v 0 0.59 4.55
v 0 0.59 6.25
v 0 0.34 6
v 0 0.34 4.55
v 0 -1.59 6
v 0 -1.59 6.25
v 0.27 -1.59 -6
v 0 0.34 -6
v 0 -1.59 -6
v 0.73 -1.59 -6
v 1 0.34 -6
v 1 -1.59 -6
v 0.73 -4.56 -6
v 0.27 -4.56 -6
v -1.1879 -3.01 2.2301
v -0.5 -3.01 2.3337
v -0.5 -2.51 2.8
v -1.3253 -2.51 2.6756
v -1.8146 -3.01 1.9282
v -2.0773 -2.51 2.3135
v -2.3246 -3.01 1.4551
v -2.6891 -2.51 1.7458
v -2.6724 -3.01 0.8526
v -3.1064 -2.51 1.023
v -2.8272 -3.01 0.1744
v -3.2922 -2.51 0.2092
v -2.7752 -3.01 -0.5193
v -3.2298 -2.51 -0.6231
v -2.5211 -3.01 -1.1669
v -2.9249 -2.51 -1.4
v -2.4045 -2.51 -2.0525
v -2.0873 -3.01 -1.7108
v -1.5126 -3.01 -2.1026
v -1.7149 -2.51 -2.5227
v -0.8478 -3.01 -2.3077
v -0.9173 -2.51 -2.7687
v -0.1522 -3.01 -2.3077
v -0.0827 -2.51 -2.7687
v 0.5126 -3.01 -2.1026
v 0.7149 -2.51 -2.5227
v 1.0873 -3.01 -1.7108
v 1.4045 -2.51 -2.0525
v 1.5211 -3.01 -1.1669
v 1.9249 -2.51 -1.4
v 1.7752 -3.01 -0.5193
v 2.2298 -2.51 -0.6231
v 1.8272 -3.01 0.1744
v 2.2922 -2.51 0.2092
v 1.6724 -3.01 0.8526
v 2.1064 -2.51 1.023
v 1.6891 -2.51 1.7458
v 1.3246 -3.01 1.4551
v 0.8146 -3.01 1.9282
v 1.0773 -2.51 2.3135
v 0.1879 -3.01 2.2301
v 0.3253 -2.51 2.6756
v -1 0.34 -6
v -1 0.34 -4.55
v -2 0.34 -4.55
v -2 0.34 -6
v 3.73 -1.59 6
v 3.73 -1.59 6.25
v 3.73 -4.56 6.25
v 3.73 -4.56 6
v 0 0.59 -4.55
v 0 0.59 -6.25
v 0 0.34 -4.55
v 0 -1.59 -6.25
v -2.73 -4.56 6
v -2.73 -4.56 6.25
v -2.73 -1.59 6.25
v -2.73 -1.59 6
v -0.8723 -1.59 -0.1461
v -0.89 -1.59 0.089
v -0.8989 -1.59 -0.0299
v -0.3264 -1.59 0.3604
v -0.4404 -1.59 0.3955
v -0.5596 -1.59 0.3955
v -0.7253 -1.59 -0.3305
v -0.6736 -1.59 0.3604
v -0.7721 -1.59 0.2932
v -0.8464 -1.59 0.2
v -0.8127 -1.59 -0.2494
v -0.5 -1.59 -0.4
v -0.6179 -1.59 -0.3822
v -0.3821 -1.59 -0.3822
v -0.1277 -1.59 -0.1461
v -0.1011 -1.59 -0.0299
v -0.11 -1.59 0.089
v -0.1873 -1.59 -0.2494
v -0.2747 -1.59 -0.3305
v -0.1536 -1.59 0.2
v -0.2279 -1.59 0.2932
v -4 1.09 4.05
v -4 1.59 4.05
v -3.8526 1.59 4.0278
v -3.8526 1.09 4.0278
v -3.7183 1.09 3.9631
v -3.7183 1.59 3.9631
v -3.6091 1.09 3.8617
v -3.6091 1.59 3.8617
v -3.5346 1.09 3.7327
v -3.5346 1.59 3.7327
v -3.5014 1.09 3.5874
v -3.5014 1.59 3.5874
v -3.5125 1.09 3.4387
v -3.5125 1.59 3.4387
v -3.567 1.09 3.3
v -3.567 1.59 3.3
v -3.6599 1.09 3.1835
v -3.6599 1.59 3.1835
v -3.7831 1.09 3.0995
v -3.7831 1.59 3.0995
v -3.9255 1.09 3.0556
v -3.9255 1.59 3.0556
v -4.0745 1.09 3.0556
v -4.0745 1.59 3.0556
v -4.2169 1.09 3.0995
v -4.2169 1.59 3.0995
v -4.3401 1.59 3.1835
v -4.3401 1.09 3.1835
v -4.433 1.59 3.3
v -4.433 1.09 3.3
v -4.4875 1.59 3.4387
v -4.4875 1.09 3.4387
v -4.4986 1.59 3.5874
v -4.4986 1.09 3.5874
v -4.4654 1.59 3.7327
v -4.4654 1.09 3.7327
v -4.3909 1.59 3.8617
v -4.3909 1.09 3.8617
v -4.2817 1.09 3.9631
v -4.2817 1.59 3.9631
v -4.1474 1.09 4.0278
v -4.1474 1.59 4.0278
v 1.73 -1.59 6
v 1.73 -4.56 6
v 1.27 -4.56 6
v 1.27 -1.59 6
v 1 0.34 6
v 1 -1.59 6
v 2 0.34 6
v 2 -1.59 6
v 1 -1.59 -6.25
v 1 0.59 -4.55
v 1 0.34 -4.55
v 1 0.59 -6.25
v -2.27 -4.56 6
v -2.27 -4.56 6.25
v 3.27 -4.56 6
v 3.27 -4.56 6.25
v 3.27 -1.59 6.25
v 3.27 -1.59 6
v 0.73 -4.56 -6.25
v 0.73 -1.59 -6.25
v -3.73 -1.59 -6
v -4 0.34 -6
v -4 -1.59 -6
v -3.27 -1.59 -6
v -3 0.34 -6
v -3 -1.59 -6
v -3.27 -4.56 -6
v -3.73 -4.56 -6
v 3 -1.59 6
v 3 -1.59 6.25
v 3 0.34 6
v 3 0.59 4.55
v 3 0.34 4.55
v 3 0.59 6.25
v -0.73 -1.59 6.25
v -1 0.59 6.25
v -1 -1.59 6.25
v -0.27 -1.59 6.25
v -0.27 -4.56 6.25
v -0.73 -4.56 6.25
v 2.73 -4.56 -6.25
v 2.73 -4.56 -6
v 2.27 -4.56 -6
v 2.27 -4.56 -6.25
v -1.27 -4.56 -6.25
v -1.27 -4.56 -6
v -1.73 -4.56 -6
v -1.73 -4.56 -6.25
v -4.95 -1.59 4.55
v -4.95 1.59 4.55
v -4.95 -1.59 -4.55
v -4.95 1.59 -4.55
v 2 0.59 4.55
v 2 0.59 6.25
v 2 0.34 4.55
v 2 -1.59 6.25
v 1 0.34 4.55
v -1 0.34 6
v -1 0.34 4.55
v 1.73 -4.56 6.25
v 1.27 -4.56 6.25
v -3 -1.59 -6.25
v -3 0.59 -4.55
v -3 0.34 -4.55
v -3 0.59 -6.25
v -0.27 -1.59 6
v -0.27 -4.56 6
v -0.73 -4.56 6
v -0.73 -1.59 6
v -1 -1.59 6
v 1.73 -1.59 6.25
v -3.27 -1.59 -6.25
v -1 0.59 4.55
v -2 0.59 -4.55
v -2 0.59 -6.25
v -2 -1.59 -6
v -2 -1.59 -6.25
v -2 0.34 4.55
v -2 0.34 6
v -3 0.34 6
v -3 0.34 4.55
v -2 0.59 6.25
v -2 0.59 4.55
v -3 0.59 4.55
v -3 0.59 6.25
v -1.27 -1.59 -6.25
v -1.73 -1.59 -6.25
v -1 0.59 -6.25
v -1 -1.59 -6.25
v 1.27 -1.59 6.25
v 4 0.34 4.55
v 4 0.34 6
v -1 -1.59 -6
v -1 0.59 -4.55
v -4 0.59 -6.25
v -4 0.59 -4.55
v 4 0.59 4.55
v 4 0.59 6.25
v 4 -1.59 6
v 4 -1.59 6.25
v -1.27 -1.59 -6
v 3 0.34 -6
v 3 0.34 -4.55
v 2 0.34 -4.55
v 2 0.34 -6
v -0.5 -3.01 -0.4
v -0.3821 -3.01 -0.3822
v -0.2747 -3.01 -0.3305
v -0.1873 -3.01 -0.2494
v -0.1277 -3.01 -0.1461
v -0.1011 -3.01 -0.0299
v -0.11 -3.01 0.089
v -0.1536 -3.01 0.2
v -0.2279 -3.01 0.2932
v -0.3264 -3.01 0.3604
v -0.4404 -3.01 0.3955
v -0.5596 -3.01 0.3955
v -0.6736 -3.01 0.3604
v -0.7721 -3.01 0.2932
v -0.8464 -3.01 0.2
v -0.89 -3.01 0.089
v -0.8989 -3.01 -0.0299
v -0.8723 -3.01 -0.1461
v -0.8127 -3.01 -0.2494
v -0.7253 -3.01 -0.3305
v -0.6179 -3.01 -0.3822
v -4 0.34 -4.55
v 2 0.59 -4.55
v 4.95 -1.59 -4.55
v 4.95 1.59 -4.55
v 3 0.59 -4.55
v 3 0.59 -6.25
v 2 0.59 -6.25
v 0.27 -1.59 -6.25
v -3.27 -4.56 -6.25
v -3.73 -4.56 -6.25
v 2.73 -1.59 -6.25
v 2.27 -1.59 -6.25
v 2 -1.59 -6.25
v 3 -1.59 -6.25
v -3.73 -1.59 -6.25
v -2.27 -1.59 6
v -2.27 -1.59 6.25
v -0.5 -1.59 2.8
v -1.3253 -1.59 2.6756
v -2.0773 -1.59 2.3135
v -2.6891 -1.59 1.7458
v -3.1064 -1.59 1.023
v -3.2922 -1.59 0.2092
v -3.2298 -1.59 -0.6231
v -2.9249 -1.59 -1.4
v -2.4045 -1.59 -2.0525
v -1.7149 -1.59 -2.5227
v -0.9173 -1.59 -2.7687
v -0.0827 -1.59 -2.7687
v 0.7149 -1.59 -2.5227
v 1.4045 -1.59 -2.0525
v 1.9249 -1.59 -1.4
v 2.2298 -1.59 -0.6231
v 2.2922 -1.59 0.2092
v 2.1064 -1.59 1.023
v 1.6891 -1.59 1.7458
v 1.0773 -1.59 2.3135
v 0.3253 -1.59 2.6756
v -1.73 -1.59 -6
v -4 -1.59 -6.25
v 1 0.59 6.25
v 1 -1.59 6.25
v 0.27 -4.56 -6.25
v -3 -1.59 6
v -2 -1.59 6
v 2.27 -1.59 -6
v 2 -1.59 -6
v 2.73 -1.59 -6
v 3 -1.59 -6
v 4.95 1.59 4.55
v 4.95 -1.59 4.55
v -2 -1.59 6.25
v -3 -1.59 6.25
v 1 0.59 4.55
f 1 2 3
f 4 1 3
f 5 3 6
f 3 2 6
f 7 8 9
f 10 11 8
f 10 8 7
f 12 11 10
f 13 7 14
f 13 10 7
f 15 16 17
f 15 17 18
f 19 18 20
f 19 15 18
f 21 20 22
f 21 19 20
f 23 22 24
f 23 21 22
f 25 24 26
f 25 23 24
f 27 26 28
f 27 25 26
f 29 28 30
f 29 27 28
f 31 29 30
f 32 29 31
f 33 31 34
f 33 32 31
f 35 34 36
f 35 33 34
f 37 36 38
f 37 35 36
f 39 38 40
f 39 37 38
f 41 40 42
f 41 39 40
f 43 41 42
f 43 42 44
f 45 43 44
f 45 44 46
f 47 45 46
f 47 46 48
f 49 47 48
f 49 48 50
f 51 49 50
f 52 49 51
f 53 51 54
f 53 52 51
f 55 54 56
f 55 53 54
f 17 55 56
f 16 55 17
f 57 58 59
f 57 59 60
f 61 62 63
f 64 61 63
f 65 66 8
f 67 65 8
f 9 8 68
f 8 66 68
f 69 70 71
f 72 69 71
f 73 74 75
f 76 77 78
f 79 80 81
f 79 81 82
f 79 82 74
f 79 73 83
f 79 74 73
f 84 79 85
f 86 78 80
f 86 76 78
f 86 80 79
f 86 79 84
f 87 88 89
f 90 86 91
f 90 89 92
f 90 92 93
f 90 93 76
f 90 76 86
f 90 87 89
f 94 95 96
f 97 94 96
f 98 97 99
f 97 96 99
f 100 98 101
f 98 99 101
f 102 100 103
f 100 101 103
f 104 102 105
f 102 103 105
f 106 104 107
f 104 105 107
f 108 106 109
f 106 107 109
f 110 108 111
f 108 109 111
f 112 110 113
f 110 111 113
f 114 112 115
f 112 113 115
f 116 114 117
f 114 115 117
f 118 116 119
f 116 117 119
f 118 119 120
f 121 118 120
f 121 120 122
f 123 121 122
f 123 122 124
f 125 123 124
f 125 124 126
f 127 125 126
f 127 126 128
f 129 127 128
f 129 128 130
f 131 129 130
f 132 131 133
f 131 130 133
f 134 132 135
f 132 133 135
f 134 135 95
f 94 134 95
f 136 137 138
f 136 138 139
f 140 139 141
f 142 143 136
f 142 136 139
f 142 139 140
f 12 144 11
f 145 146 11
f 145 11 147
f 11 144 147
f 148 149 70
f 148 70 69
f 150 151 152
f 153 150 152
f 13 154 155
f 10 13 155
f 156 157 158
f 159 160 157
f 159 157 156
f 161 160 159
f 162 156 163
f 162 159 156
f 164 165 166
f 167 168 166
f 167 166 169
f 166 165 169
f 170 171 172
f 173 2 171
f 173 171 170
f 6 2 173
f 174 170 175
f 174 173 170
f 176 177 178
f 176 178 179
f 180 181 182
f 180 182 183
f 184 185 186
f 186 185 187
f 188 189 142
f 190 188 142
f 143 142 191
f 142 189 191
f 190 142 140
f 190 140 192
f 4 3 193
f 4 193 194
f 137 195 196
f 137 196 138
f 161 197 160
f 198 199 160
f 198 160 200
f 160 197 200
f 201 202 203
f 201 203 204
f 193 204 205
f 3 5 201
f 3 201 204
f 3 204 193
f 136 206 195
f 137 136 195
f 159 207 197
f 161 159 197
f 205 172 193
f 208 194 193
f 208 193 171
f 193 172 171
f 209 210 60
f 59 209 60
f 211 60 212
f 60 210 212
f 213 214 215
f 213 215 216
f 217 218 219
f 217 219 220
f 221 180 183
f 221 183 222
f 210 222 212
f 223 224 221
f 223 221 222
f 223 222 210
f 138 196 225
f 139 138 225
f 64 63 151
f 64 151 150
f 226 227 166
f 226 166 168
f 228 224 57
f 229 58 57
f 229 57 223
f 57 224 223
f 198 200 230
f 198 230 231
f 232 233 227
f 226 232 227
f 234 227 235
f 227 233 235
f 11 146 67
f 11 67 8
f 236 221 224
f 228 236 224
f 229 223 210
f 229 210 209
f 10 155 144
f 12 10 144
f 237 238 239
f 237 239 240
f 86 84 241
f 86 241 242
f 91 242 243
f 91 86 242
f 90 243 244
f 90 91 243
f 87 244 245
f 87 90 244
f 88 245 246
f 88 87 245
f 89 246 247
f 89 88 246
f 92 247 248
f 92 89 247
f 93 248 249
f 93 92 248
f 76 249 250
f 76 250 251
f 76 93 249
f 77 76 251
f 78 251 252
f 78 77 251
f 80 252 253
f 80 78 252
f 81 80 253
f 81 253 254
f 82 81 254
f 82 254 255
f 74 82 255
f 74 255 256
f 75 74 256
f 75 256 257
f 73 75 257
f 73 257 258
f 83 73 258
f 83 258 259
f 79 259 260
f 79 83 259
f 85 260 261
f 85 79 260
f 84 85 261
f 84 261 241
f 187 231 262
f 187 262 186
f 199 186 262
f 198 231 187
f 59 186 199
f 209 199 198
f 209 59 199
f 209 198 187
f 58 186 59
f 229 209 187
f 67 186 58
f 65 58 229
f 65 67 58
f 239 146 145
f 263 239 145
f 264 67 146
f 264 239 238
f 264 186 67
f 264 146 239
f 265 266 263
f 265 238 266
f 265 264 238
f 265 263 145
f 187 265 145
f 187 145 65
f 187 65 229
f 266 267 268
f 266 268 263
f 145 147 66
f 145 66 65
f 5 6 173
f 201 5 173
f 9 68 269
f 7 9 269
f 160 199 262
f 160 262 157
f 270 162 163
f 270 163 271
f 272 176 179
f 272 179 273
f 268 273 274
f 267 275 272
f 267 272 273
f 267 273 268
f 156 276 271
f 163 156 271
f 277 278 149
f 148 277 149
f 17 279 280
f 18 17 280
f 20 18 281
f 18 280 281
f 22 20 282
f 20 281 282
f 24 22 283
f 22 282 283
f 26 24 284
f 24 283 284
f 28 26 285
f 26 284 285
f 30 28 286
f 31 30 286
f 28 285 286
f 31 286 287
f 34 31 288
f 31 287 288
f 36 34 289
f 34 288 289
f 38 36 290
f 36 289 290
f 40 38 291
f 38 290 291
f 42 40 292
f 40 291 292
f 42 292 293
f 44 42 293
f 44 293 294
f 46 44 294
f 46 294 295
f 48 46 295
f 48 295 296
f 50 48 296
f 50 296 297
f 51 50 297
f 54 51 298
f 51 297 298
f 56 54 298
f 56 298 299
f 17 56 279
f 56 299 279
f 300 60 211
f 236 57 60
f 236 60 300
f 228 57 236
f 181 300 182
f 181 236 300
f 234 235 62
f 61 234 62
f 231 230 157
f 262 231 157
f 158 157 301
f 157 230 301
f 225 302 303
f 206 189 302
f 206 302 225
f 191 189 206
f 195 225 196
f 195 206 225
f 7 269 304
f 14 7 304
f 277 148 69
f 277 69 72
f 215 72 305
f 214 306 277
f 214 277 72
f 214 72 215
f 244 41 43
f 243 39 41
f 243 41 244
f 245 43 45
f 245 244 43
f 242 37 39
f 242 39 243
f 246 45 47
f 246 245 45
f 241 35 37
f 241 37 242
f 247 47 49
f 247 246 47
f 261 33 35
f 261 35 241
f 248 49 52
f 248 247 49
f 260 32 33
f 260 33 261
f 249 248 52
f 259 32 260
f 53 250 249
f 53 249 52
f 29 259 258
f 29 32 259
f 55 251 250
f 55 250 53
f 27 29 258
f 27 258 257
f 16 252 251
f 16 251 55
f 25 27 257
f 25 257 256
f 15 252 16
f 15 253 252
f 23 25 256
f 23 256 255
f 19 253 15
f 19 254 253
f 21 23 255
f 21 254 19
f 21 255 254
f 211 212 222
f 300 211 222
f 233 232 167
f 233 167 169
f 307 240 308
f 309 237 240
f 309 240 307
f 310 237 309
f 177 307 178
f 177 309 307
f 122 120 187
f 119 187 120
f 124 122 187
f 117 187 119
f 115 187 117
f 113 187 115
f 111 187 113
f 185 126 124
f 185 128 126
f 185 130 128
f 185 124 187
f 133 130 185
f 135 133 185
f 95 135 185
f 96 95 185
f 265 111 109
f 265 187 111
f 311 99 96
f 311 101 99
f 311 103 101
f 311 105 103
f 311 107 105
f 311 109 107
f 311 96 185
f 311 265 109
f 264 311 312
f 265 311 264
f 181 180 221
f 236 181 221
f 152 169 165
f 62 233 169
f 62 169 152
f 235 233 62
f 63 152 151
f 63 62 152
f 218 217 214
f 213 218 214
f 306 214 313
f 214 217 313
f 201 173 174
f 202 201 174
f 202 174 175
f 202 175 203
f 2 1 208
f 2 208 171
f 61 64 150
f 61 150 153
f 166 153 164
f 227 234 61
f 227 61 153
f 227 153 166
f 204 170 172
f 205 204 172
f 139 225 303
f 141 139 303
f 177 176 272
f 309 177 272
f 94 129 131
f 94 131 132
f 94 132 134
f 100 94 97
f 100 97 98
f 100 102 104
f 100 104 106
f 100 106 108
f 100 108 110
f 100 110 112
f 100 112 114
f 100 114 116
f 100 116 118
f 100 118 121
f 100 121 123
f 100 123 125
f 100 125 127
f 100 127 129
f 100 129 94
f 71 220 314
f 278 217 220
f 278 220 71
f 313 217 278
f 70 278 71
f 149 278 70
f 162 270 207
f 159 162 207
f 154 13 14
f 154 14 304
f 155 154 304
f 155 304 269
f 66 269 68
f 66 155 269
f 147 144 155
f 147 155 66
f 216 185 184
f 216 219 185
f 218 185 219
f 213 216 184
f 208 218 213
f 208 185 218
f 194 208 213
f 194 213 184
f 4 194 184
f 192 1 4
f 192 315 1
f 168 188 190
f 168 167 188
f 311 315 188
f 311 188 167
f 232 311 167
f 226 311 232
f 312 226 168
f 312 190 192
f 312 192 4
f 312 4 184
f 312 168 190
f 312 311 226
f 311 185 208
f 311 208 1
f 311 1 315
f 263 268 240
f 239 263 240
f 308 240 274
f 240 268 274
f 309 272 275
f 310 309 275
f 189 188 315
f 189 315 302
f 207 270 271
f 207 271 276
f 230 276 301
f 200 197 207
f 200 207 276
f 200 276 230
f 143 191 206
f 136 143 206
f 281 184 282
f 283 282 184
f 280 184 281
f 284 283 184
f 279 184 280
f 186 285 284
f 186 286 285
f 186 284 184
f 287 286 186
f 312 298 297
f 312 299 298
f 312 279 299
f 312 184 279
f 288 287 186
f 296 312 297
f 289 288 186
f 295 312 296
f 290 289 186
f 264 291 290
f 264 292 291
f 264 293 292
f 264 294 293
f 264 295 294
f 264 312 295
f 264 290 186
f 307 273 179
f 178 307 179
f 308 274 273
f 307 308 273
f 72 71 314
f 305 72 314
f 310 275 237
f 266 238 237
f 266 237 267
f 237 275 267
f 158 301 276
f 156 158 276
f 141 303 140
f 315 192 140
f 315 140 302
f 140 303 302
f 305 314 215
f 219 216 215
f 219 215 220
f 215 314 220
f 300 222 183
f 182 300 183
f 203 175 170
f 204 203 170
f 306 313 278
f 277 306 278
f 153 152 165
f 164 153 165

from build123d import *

# Parameters (mm, degrees)
EXTRUDE_1_DEPTH     = 4.95
SKETCH_2_R          = 0.5
CUT_EXTRUDE_1_DEPTH = 0.5
CUT_EXTRUDE_2_REACH = 16.197
CUT_EXTRUDE_3_REACH = 16.197
SKETCH_5_R          = 2.8
SKETCH_5_R_2        = 0.4
EXTRUDE_2_DEPTH     = 1.42
CHAMFER_1_SIZE      = 0.5
CHAMFER_1_SIZE2     = 0.466257543


with BuildPart() as part:
    # Эскиз1 → Бобышка-Вытянуть1 (new, symmetric)
    with BuildSketch(Plane(origin=(0, 0, 0), x_dir=(0, 0, -1), z_dir=(1, 0, 0))):
        Polygon((0, 1.59), (-4.55, 1.59), (-4.55, 0.59), (-4.55, 0.34), (-4.55, -1.59), (0, -1.59), align=None)
        Polygon((4.55, 1.59), (0, 1.59), (0, -1.59), (4.55, -1.59), (4.55, 0.34), (4.55, 0.59), align=None)
        Polygon((-4.55, 0.34), (-4.55, 0.59), (-6.25, 0.59), (-6.25, -4.56), (-6, -4.56), (-6, 0.34), align=None)
        Polygon((6.25, 0.59), (4.55, 0.59), (4.55, 0.34), (6, 0.34), (6, -4.56), (6.25, -4.56), align=None)
    extrude(amount=EXTRUDE_1_DEPTH, both=True)

    # Эскиз2 → Вырез-Вытянуть1 (cut)
    with BuildSketch(Plane(origin=(0, 1.59, 0), x_dir=(1, 0, 0), z_dir=(0, 1, 0))):
        with Locations(Location((-4, -3.55, 0), (0, 0, 270))):
            Circle(SKETCH_2_R)
    extrude(amount=-CUT_EXTRUDE_1_DEPTH, mode=Mode.SUBTRACT)

    # Вырез-Вытянуть2: up to this face of the body (flat: up to its plane)
    cut_extrude_2_end = Plane(part.part.faces().sort_by_distance((0, -0.625, 4.55))[0])
    # Эскиз3 → Вырез-Вытянуть2 (cut, up to the picked face)
    with BuildSketch(Plane.XY.offset(6.25), mode=Mode.PRIVATE) as cut_extrude_2_sk1:
        Polygon((-3, -1.59), (-3, 0.59), (-4.95, 0.59), (-4.95, -4.56), (-2.73, -4.56), (-2.73, -1.59), align=None)
    cut_extrude_2_tool1 = split(extrude(cut_extrude_2_sk1.sketch, amount=-CUT_EXTRUDE_2_REACH, mode=Mode.PRIVATE), bisect_by=cut_extrude_2_end, keep=Keep.BOTH, mode=Mode.PRIVATE)
    # Эскиз3 → Вырез-Вытянуть2 (cut, up to the picked face)
    with BuildSketch(Plane.XY.offset(6.25), mode=Mode.PRIVATE) as cut_extrude_2_sk2:
        Polygon((-1, 0.59), (-2, 0.59), (-2, -1.59), (-2.27, -1.59), (-2.27, -4.56), (-0.73, -4.56), (-0.73, -1.59), (-1, -1.59), align=None)
    cut_extrude_2_tool2 = split(extrude(cut_extrude_2_sk2.sketch, amount=-CUT_EXTRUDE_2_REACH, mode=Mode.PRIVATE), bisect_by=cut_extrude_2_end, keep=Keep.BOTH, mode=Mode.PRIVATE)
    # Эскиз3 → Вырез-Вытянуть2 (cut, up to the picked face)
    with BuildSketch(Plane.XY.offset(6.25), mode=Mode.PRIVATE) as cut_extrude_2_sk3:
        Polygon((1, 0.59), (0, 0.59), (0, -1.59), (-0.27, -1.59), (-0.27, -4.56), (1.27, -4.56), (1.27, -1.59), (1, -1.59), align=None)
    cut_extrude_2_tool3 = split(extrude(cut_extrude_2_sk3.sketch, amount=-CUT_EXTRUDE_2_REACH, mode=Mode.PRIVATE), bisect_by=cut_extrude_2_end, keep=Keep.BOTH, mode=Mode.PRIVATE)
    # Эскиз3 → Вырез-Вытянуть2 (cut, up to the picked face)
    with BuildSketch(Plane.XY.offset(6.25), mode=Mode.PRIVATE) as cut_extrude_2_sk4:
        Polygon((3, 0.59), (2, 0.59), (2, -1.59), (1.73, -1.59), (1.73, -4.56), (3.27, -4.56), (3.27, -1.59), (3, -1.59), align=None)
    cut_extrude_2_tool4 = split(extrude(cut_extrude_2_sk4.sketch, amount=-CUT_EXTRUDE_2_REACH, mode=Mode.PRIVATE), bisect_by=cut_extrude_2_end, keep=Keep.BOTH, mode=Mode.PRIVATE)
    # Эскиз3 → Вырез-Вытянуть2 (cut, up to the picked face)
    with BuildSketch(Plane.XY.offset(6.25), mode=Mode.PRIVATE) as cut_extrude_2_sk5:
        Polygon((4.95, 0.59), (4, 0.59), (4, -1.59), (3.73, -1.59), (3.73, -4.56), (4.95, -4.56), align=None)
    cut_extrude_2_tool5 = split(extrude(cut_extrude_2_sk5.sketch, amount=-CUT_EXTRUDE_2_REACH, mode=Mode.PRIVATE), bisect_by=cut_extrude_2_end, keep=Keep.BOTH, mode=Mode.PRIVATE)
    add(cut_extrude_2_tool1.solids().sort_by(Axis((-3.89292, -2.065601, 6.25), (0, 0, -1)))[0], mode=Mode.SUBTRACT)
    add(cut_extrude_2_tool2.solids().sort_by(Axis((-1.5, -2.243838, 6.25), (0, 0, -1)))[0], mode=Mode.SUBTRACT)
    add(cut_extrude_2_tool3.solids().sort_by(Axis((0.5, -2.243838, 6.25), (0, 0, -1)))[0], mode=Mode.SUBTRACT)
    add(cut_extrude_2_tool4.solids().sort_by(Axis((2.5, -2.243838, 6.25), (0, 0, -1)))[0], mode=Mode.SUBTRACT)
    add(cut_extrude_2_tool5.solids().sort_by(Axis((4.389098, -2.138497, 6.25), (0, 0, -1)))[0], mode=Mode.SUBTRACT)

    # Вырез-Вытянуть3: up to this face of the body (flat: up to its plane)
    cut_extrude_3_end = Plane(part.part.faces().sort_by_distance((0, -0.625, -4.55))[0])
    # Эскиз4 → Вырез-Вытянуть3 (cut, up to the picked face)
    with BuildSketch(Plane(origin=(0, 0, -6.25), x_dir=(-1, 0, 0), z_dir=(0, 0, -1)), mode=Mode.PRIVATE) as cut_extrude_3_sk1:
        Polygon((-3, -1.59), (-3, 0.59), (-4.95, 0.59), (-4.95, -4.56), (-2.73, -4.56), (-2.73, -1.59), align=None)
    cut_extrude_3_tool1 = split(extrude(cut_extrude_3_sk1.sketch, amount=-CUT_EXTRUDE_3_REACH, mode=Mode.PRIVATE), bisect_by=cut_extrude_3_end, keep=Keep.BOTH, mode=Mode.PRIVATE)
    # Эскиз4 → Вырез-Вытянуть3 (cut, up to the picked face)
    with BuildSketch(Plane(origin=(0, 0, -6.25), x_dir=(-1, 0, 0), z_dir=(0, 0, -1)), mode=Mode.PRIVATE) as cut_extrude_3_sk2:
        Polygon((-1, 0.59), (-2, 0.59), (-2, -1.59), (-2.27, -1.59), (-2.27, -4.56), (-0.73, -4.56), (-0.73, -1.59), (-1, -1.59), align=None)
    cut_extrude_3_tool2 = split(extrude(cut_extrude_3_sk2.sketch, amount=-CUT_EXTRUDE_3_REACH, mode=Mode.PRIVATE), bisect_by=cut_extrude_3_end, keep=Keep.BOTH, mode=Mode.PRIVATE)
    # Эскиз4 → Вырез-Вытянуть3 (cut, up to the picked face)
    with BuildSketch(Plane(origin=(0, 0, -6.25), x_dir=(-1, 0, 0), z_dir=(0, 0, -1)), mode=Mode.PRIVATE) as cut_extrude_3_sk3:
        Polygon((1, 0.59), (0, 0.59), (0, -1.59), (-0.27, -1.59), (-0.27, -4.56), (1.27, -4.56), (1.27, -1.59), (1, -1.59), align=None)
    cut_extrude_3_tool3 = split(extrude(cut_extrude_3_sk3.sketch, amount=-CUT_EXTRUDE_3_REACH, mode=Mode.PRIVATE), bisect_by=cut_extrude_3_end, keep=Keep.BOTH, mode=Mode.PRIVATE)
    # Эскиз4 → Вырез-Вытянуть3 (cut, up to the picked face)
    with BuildSketch(Plane(origin=(0, 0, -6.25), x_dir=(-1, 0, 0), z_dir=(0, 0, -1)), mode=Mode.PRIVATE) as cut_extrude_3_sk4:
        Polygon((3, 0.59), (2, 0.59), (2, -1.59), (1.73, -1.59), (1.73, -4.56), (3.27, -4.56), (3.27, -1.59), (3, -1.59), align=None)
    cut_extrude_3_tool4 = split(extrude(cut_extrude_3_sk4.sketch, amount=-CUT_EXTRUDE_3_REACH, mode=Mode.PRIVATE), bisect_by=cut_extrude_3_end, keep=Keep.BOTH, mode=Mode.PRIVATE)
    # Эскиз4 → Вырез-Вытянуть3 (cut, up to the picked face)
    with BuildSketch(Plane(origin=(0, 0, -6.25), x_dir=(-1, 0, 0), z_dir=(0, 0, -1)), mode=Mode.PRIVATE) as cut_extrude_3_sk5:
        Polygon((4.95, 0.59), (4, 0.59), (4, -1.59), (3.73, -1.59), (3.73, -4.56), (4.95, -4.56), align=None)
    cut_extrude_3_tool5 = split(extrude(cut_extrude_3_sk5.sketch, amount=-CUT_EXTRUDE_3_REACH, mode=Mode.PRIVATE), bisect_by=cut_extrude_3_end, keep=Keep.BOTH, mode=Mode.PRIVATE)
    add(cut_extrude_3_tool1.solids().sort_by(Axis((3.89292, -2.065601, -6.25), (0, 0, 1)))[0], mode=Mode.SUBTRACT)
    add(cut_extrude_3_tool2.solids().sort_by(Axis((1.5, -2.243838, -6.25), (0, 0, 1)))[0], mode=Mode.SUBTRACT)
    add(cut_extrude_3_tool3.solids().sort_by(Axis((-0.5, -2.243838, -6.25), (0, 0, 1)))[0], mode=Mode.SUBTRACT)
    add(cut_extrude_3_tool4.solids().sort_by(Axis((-2.5, -2.243838, -6.25), (0, 0, 1)))[0], mode=Mode.SUBTRACT)
    add(cut_extrude_3_tool5.solids().sort_by(Axis((-4.389098, -2.138497, -6.25), (0, 0, 1)))[0], mode=Mode.SUBTRACT)

    # Эскиз5 → Бобышка-Вытянуть2 (add)
    with BuildSketch(Plane.XZ.offset(1.59)):
        with Locations(Location((-0.5, 0, 0), (0, 0, 90))):
            Circle(SKETCH_5_R)
        with Locations(Location((-0.5, 0, 0), (0, 0, 270))):
            Circle(SKETCH_5_R_2, mode=Mode.SUBTRACT)
    extrude(amount=EXTRUDE_2_DEPTH)

    # Фаска1
    chamfer_1_edges = [part.edges().sort_by_distance(p)[0] for p in [
        (-0.5, -3.01, -2.8),
    ]]
    chamfer_1_side = [part.faces().sort_by_distance(p)[0] for p in [
        (-0.5, -2.3, -2.8),
    ]]
    chamfer(chamfer_1_edges, length=CHAMFER_1_SIZE, length2=CHAMFER_1_SIZE2, reference=chamfer_1_side[0])


solid = part.part
